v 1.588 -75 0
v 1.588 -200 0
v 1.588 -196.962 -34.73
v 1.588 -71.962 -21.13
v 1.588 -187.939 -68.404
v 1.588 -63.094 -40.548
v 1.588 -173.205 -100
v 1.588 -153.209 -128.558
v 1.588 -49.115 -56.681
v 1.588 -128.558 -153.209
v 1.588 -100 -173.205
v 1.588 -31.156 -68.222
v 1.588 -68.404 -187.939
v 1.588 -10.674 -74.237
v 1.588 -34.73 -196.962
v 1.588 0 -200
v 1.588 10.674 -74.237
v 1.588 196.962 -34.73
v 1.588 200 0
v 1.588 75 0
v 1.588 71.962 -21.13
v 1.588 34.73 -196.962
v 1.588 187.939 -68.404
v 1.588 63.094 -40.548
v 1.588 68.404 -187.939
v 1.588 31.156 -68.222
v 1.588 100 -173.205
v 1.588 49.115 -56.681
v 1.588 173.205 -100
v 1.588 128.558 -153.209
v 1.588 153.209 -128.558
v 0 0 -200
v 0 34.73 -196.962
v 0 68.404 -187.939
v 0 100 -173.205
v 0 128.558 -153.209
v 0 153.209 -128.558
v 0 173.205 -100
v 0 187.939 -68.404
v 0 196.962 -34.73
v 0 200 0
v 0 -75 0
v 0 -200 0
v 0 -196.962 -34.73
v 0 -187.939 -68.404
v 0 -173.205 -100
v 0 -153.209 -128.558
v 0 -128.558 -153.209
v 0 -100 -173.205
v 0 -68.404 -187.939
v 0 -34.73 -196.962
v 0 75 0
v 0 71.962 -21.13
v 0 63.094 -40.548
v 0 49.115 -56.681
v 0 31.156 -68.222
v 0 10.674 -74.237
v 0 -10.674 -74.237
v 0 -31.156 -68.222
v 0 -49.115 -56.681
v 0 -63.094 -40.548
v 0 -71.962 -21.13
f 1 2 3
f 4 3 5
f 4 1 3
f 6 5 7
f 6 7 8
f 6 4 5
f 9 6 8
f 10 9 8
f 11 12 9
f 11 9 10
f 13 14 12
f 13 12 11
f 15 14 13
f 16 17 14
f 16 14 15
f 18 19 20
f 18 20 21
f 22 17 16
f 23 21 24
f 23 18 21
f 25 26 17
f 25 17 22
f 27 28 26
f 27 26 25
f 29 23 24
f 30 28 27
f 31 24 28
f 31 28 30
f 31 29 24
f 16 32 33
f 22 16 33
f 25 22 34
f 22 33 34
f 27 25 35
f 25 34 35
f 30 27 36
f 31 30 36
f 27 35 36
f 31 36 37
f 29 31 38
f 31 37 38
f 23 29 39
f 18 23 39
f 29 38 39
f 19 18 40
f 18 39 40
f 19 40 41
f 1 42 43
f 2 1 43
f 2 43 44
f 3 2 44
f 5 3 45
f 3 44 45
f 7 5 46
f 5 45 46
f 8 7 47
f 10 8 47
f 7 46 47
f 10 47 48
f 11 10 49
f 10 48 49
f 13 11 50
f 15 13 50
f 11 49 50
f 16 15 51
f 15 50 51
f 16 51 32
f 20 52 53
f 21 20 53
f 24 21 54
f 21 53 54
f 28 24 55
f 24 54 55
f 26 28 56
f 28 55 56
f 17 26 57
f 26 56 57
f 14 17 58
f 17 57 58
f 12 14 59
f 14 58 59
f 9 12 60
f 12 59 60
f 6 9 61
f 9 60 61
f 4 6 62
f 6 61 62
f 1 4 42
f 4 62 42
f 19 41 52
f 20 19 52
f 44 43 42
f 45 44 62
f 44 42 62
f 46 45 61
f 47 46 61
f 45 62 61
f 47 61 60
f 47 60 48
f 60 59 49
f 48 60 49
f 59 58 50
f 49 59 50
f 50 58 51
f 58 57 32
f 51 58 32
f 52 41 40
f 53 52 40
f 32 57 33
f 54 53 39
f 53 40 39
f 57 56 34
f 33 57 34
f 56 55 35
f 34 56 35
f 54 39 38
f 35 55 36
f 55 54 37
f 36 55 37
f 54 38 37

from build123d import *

# Parameters (mm, degrees)
BOSS_EXTRUDE1_DEPTH = 1.5875


with BuildPart() as part:
    # Sketch1 → Boss-Extrude1 (new body)
    with BuildSketch(Plane(origin=(0, 0, 0), x_dir=(0, 0, -1), z_dir=(1, 0, 0))):
        with BuildLine():
            ThreePointArc((200, 0), (141.421356237, 141.421356237), (0, 200))
            Line((0, 200), (0, 75))
            ThreePointArc((0, 75), (53.033008589, 53.033008589), (75, 0))
            ThreePointArc((75, 0), (53.033008589, -53.033008589), (0, -75))
            Line((0, -75), (0, -200))
            ThreePointArc((0, -200), (141.421356237, -141.421356237), (200, 0))
        make_face()
    extrude(amount=BOSS_EXTRUDE1_DEPTH)


solid = part.part
